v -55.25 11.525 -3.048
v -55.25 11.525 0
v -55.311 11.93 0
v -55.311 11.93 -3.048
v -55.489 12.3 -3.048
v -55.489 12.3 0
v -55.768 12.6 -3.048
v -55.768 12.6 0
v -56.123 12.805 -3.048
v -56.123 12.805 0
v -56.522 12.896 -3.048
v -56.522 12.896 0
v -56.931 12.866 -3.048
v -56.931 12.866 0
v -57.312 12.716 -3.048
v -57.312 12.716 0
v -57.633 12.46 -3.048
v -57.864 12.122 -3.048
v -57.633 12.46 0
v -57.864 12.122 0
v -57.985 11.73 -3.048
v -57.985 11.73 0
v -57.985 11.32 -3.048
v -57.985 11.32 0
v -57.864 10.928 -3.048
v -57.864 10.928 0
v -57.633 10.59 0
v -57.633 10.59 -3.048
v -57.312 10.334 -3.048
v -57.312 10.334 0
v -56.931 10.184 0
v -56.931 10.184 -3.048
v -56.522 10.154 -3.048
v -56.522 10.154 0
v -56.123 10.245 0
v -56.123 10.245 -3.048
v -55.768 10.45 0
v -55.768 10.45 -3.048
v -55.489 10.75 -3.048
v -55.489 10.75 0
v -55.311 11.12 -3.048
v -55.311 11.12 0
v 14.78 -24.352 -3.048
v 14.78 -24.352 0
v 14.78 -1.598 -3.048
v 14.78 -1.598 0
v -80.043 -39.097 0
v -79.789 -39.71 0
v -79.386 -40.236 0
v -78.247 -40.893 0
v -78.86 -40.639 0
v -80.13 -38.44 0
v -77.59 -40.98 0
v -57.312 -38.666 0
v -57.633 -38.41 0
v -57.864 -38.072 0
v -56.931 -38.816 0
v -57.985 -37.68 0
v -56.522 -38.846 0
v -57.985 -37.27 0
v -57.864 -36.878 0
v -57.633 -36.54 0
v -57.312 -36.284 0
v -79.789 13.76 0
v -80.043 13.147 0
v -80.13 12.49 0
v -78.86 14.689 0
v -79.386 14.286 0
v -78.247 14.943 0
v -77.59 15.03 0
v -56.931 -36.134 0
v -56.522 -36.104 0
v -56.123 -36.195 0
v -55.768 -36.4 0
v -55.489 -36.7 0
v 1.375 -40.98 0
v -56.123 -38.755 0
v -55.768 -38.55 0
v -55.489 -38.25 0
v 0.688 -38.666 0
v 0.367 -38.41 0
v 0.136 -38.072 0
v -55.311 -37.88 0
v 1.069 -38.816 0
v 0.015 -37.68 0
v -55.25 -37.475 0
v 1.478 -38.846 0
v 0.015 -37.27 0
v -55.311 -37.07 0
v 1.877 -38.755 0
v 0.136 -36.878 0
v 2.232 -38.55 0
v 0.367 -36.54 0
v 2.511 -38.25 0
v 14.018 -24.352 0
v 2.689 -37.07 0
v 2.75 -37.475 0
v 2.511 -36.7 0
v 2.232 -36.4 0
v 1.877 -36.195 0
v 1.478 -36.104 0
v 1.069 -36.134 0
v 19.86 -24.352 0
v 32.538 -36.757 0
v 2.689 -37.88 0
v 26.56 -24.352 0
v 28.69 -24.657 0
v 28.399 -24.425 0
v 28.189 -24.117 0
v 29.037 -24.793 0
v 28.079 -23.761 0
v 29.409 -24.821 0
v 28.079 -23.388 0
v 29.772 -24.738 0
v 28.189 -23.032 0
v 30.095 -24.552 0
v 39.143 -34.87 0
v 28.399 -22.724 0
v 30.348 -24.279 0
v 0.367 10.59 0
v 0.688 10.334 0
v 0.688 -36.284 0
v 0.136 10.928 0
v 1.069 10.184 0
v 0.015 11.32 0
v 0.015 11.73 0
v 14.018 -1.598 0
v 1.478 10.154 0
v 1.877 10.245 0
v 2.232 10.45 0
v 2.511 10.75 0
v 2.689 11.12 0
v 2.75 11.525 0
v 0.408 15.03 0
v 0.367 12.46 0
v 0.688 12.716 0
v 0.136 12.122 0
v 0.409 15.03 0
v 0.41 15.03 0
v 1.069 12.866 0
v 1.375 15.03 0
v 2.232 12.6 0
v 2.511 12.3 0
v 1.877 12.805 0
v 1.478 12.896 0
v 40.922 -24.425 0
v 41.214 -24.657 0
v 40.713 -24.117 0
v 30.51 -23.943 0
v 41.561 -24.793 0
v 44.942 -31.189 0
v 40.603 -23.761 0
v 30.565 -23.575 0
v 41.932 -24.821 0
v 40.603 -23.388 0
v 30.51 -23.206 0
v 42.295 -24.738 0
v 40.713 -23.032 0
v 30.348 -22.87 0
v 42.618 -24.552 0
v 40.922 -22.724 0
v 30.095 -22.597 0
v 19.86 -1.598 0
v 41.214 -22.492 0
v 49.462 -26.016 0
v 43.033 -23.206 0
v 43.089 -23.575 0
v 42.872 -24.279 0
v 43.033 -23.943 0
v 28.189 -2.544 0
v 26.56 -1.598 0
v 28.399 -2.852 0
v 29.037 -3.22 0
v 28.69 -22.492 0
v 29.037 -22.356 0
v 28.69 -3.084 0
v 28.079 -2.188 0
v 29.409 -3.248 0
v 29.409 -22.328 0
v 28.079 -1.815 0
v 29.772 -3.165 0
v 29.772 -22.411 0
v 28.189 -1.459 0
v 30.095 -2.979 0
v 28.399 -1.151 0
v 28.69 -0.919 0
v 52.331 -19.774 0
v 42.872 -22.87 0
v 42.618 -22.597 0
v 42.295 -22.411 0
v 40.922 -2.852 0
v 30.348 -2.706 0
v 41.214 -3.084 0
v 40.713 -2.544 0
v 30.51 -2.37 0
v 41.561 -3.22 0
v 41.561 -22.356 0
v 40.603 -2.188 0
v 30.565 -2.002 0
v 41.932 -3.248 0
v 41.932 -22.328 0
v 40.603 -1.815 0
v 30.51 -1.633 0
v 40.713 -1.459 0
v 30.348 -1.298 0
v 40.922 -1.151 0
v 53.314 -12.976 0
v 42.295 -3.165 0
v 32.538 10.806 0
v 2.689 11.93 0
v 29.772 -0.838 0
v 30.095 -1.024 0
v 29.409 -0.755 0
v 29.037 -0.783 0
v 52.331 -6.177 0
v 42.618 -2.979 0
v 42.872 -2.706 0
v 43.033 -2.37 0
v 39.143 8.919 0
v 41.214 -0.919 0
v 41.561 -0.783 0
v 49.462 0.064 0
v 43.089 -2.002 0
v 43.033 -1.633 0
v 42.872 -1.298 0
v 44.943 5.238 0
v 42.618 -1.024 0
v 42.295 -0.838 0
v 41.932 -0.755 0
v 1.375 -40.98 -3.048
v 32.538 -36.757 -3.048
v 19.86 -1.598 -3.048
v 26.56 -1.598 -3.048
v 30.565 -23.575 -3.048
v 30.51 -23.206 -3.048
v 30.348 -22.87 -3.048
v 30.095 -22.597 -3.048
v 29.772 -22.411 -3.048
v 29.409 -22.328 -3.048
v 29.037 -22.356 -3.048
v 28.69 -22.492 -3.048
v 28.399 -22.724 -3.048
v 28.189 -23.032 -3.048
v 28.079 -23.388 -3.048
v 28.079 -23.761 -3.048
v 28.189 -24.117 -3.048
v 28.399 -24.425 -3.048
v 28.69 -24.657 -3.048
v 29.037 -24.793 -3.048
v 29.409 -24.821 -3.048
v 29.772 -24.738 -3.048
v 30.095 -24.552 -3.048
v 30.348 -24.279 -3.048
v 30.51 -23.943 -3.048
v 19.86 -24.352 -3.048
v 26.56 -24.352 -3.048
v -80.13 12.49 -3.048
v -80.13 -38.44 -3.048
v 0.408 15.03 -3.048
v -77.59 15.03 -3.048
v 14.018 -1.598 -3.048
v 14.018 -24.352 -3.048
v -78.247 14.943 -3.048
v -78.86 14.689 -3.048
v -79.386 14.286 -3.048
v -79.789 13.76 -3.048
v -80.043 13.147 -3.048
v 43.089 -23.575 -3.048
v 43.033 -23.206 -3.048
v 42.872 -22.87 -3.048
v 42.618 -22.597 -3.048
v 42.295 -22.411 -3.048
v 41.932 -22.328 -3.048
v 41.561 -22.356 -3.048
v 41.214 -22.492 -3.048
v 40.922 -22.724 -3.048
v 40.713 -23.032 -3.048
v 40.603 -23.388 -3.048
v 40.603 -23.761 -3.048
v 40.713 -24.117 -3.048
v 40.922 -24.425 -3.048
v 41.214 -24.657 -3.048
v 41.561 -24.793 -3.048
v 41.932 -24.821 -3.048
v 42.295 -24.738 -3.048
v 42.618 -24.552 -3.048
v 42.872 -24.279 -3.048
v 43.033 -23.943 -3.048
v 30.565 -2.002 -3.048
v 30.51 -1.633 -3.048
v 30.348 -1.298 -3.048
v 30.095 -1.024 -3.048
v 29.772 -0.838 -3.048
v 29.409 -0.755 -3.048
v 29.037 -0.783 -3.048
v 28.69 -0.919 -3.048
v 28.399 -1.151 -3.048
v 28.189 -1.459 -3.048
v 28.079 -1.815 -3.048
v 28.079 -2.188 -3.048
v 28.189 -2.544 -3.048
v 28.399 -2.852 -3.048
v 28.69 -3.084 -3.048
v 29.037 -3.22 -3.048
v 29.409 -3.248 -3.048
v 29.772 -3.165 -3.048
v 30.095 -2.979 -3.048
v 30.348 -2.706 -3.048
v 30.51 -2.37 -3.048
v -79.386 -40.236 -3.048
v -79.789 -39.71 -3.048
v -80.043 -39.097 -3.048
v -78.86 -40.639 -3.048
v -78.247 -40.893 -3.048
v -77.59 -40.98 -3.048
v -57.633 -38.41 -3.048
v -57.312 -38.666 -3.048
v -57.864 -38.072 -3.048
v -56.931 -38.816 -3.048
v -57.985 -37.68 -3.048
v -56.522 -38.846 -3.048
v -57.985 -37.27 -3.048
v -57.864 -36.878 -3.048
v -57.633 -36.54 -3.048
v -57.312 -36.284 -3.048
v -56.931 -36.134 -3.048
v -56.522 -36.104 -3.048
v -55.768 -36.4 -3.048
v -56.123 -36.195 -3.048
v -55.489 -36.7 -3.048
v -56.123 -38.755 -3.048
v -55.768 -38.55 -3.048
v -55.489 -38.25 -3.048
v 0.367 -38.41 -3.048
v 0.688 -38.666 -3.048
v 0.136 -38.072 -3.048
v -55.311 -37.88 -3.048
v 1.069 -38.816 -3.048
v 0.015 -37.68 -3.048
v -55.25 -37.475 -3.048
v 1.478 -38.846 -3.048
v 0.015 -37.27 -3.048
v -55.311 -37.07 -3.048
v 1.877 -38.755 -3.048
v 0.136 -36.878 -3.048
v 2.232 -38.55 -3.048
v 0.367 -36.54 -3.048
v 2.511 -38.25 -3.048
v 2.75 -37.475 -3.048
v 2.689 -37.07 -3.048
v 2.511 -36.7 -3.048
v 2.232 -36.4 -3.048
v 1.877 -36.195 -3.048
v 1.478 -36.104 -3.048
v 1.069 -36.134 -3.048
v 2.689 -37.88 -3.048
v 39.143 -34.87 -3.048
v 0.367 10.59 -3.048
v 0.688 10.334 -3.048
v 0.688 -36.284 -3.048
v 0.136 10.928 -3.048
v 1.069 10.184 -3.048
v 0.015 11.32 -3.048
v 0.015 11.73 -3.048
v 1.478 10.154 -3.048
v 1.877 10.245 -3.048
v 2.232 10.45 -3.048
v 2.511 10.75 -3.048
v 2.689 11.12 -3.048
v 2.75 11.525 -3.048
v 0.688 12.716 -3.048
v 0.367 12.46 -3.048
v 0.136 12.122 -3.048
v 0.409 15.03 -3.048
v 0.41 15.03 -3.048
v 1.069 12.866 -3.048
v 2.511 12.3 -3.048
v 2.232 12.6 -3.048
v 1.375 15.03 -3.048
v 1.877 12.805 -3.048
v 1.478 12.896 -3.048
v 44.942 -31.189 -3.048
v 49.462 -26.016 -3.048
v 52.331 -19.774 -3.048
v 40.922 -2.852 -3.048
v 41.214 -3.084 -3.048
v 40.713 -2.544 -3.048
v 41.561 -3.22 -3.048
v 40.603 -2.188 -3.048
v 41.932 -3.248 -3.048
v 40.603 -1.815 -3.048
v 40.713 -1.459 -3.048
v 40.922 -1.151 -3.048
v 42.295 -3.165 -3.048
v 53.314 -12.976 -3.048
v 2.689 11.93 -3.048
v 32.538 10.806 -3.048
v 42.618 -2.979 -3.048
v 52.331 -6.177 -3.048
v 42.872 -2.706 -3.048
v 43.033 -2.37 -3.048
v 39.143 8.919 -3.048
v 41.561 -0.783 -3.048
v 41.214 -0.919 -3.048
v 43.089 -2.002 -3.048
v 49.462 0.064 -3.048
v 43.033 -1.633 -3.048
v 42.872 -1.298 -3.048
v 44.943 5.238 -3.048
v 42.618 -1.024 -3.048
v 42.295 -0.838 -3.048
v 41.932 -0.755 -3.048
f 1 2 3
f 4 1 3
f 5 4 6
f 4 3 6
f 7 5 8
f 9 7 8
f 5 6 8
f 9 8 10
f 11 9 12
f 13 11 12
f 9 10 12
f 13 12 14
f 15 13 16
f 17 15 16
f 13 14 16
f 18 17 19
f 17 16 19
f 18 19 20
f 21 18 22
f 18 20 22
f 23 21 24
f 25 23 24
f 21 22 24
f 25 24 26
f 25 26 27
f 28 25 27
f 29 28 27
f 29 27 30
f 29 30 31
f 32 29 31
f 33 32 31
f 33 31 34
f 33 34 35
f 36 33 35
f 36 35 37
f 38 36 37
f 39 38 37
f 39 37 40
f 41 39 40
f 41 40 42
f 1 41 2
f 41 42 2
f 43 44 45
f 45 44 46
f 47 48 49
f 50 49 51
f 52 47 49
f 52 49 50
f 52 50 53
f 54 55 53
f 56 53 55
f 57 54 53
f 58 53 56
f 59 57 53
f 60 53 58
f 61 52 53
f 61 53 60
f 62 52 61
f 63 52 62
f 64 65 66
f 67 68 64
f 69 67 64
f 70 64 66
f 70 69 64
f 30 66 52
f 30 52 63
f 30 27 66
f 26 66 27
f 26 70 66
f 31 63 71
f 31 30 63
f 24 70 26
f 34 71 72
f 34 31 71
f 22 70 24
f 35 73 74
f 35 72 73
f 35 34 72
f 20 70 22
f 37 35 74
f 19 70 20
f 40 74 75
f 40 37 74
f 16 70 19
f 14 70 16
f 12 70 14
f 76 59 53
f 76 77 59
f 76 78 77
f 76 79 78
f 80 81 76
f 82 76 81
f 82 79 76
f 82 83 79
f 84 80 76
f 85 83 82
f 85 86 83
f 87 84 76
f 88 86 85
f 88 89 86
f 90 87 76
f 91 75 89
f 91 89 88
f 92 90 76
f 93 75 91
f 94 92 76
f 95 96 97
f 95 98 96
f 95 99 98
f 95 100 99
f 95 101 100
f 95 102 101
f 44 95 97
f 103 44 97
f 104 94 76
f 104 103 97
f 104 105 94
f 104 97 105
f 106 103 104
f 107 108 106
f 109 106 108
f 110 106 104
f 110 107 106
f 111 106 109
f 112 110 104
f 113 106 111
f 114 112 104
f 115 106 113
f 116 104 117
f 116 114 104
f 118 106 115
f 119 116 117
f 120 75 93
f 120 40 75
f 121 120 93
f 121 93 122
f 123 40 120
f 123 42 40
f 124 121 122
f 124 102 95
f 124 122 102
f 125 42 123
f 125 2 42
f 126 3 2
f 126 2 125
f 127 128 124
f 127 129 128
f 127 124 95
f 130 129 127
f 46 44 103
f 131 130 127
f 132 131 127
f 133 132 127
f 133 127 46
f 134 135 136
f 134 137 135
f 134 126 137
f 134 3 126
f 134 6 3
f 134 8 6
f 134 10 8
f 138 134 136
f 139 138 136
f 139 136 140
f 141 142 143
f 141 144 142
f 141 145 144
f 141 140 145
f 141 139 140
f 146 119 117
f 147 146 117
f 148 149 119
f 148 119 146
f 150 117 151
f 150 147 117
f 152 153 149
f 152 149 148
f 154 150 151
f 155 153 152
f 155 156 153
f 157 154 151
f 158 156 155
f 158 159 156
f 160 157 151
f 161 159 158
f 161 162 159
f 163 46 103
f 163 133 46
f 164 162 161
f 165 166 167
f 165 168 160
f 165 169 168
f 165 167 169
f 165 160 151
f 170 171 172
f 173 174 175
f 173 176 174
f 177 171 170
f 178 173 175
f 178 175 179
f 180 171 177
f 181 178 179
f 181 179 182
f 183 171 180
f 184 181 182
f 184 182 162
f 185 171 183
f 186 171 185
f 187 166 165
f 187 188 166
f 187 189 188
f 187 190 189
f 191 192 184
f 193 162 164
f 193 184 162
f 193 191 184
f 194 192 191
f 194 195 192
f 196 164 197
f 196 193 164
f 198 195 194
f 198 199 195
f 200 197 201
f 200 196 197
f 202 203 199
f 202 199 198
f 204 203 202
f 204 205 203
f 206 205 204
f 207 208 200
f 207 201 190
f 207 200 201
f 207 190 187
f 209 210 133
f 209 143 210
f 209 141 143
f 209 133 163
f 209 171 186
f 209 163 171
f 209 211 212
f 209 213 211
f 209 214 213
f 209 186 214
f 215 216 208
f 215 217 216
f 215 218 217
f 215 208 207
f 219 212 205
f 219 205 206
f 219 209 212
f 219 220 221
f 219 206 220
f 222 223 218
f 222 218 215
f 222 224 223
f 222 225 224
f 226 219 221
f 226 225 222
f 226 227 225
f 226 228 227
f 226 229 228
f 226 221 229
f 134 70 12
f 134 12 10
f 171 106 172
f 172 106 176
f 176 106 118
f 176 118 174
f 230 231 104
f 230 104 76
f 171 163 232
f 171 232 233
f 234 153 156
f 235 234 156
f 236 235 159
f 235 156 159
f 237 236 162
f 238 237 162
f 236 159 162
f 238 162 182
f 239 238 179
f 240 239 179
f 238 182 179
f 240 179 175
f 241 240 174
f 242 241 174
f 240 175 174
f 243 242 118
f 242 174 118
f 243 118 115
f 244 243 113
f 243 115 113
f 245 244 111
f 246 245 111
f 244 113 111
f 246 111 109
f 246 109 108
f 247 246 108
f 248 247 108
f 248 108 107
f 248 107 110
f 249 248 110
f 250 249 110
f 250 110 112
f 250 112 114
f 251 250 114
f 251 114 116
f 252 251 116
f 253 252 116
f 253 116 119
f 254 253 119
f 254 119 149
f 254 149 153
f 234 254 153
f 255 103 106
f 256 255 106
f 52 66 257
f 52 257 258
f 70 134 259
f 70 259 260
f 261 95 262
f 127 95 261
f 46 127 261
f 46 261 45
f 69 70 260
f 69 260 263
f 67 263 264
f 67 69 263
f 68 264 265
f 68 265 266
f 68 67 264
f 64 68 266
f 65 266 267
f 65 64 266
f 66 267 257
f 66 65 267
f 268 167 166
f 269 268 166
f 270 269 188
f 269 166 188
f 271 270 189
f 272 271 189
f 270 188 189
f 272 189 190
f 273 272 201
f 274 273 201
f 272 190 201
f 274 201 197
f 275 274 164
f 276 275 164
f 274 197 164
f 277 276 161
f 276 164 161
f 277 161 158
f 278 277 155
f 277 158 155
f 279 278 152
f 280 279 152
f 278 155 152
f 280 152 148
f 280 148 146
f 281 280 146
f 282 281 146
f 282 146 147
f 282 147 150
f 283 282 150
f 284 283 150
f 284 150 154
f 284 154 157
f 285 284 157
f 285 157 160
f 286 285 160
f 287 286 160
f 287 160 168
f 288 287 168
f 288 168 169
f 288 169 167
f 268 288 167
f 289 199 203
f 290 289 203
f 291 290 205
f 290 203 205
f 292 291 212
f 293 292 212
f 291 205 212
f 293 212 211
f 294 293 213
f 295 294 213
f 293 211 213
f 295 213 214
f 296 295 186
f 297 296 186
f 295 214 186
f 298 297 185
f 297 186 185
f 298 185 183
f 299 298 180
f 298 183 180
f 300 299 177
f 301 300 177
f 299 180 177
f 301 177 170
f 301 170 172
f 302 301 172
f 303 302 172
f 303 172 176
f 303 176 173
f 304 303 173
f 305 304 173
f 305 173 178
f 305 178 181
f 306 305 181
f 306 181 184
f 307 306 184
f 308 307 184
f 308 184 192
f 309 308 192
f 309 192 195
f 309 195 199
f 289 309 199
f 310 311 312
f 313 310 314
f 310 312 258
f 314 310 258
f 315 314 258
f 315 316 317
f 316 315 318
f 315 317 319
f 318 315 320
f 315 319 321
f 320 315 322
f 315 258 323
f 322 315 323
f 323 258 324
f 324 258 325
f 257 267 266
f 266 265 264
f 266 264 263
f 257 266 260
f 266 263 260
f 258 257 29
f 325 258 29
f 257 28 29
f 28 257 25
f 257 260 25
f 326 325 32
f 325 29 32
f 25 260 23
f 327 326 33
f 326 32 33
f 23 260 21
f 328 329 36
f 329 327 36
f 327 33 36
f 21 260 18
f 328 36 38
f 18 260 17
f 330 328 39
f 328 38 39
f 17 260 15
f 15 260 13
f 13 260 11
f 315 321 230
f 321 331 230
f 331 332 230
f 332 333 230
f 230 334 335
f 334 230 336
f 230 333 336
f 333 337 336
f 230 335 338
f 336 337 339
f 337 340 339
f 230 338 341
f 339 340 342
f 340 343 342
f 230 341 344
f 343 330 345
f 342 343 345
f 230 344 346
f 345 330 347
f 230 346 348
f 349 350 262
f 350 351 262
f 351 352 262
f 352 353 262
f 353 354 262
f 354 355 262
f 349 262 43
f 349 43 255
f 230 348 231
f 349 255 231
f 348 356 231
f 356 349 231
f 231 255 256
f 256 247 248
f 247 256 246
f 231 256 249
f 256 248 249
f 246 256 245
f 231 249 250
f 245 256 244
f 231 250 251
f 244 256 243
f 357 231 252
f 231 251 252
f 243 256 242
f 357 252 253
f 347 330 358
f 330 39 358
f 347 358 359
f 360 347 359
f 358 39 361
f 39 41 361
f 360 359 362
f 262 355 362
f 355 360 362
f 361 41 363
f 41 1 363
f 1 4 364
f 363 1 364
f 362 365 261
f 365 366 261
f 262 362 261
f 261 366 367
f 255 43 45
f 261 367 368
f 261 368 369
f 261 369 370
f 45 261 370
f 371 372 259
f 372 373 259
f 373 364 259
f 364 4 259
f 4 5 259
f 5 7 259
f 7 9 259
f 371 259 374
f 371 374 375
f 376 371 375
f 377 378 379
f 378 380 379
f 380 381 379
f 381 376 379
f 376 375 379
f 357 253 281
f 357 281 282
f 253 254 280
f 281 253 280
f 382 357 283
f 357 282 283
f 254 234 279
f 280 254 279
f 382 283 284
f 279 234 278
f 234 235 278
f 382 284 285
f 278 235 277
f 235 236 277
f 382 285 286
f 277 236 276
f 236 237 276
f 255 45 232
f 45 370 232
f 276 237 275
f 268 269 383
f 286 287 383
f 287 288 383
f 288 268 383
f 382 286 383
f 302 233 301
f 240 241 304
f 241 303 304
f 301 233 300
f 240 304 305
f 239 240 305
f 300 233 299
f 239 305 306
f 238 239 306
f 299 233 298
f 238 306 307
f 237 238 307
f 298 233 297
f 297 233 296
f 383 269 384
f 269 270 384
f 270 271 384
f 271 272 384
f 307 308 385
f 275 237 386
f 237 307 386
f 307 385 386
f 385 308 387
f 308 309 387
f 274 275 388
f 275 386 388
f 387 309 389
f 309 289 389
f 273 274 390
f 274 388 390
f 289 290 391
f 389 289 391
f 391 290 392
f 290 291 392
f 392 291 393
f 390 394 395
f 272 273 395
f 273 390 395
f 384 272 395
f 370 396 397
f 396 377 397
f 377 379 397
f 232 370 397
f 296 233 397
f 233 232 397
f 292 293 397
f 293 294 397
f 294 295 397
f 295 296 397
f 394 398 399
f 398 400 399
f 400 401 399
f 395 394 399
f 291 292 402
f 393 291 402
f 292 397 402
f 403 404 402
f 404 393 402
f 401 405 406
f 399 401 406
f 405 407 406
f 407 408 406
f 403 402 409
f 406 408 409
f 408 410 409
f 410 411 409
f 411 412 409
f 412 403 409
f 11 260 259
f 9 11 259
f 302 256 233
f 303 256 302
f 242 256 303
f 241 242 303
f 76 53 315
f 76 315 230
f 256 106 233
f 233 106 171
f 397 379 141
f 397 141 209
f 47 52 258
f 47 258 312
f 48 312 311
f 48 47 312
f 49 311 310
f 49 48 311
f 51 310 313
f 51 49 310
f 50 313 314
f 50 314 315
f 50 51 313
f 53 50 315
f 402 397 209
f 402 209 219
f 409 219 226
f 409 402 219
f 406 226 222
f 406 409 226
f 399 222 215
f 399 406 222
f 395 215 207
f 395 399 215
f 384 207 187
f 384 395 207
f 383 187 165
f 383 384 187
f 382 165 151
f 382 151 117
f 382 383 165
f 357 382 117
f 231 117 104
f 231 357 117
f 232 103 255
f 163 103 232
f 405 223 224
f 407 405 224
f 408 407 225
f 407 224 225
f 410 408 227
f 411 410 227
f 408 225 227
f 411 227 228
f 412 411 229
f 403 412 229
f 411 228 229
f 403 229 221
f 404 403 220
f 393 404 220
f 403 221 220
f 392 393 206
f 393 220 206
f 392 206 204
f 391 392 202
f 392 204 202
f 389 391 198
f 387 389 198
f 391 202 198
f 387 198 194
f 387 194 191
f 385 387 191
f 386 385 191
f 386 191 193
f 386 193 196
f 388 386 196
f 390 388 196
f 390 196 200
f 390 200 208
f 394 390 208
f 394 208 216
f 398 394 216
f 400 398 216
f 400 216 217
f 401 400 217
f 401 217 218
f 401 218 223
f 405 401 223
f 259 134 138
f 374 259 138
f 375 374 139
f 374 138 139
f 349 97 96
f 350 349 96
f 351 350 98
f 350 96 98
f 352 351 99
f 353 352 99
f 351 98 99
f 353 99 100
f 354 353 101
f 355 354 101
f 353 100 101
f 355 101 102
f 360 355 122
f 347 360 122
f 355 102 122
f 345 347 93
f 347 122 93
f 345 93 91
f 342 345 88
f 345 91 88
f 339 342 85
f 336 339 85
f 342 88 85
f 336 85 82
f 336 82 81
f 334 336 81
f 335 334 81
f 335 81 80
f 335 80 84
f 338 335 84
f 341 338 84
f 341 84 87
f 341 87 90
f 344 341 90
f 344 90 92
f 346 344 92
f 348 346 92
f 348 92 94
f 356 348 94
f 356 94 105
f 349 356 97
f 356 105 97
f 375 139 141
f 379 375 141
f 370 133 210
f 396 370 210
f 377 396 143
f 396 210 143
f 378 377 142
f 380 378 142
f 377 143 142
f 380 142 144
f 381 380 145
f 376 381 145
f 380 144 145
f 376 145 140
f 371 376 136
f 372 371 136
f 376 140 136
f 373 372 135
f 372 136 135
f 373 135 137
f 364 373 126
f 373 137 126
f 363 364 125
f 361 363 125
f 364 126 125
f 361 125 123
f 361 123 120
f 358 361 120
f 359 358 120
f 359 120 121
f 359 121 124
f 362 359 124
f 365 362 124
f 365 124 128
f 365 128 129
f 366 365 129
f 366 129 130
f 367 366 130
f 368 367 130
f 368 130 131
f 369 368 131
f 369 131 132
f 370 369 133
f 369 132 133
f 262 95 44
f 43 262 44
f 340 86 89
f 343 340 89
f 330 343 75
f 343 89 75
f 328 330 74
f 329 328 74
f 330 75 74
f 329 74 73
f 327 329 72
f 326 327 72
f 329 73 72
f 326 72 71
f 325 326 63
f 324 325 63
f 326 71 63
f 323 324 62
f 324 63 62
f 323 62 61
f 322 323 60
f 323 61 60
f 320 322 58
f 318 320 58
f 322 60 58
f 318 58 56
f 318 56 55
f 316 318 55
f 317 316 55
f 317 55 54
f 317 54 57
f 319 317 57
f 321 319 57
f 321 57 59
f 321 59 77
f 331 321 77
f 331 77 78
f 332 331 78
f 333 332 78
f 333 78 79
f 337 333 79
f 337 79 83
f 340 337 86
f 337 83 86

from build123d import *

# Parameters (mm, degrees)
SKETCH1_R           = 1.37499852
BOSS_EXTRUDE1_DEPTH = 3.048
SKETCH2_R           = 1.25
SKETCH2_W           = 6.7
SKETCH2_H           = 22.7542
SKETCH2_W_2         = 0.762
CUT_EXTRUDE1_DEPTH  = 4.048
SKETCH3_R           = 1.37499852
BOSS_EXTRUDE2_DEPTH = 3.048
CUT_EXTRUDE3_DEPTH  = 4.048


with BuildPart() as part:
    # Sketch1 → Boss-Extrude1 (new body)
    with BuildSketch(Plane.XY):
        with BuildLine():
            Line((0.41036367, 15.02963974), (60.10036367, 15.02963974))
            ThreePointArc((60.10036367, 15.02963974), (61.896414894, 14.285690964), (62.64036367, 12.48963974))
            Line((62.64036367, 12.48963974), (62.64036367, -38.4396361))
            ThreePointArc((62.64036367, -38.4396361), (61.896414894, -40.235687324), (60.10036367, -40.9796361))
            Line((60.10036367, -40.9796361), (0.41036367, -40.9796361))
            ThreePointArc((0.41036367, -40.9796361), (-1.385687554, -40.235687324), (-2.12963633, -38.4396361))
            Line((-2.12963633, -38.4396361), (-2.12963633, 12.48963974))
            ThreePointArc((-2.12963633, 12.48963974), (-1.385687554, 14.285690964), (0.41036367, 15.02963974))
        make_face()
        with Locations((1.37500106, 11.52500108)):
            Circle(SKETCH1_R, mode=Mode.SUBTRACT)
        with Locations((59.3750019, 11.52500108)):
            Circle(SKETCH1_R, mode=Mode.SUBTRACT)
        with Locations((59.3750019, -37.47499998)):
            Circle(SKETCH1_R, mode=Mode.SUBTRACT)
        with Locations((1.37500106, -37.47499998)):
            Circle(SKETCH1_R, mode=Mode.SUBTRACT)
    extrude(amount=-BOSS_EXTRUDE1_DEPTH)

    # Sketch2 → Cut-Extrude1 (cut, through all)
    with BuildSketch(Plane.XY):
        with Locations((29.315152151, -2.00169818)):
            Circle(SKETCH2_R)
        with Locations((41.838752151, -2.00169818)):
            Circle(SKETCH2_R)
        with Locations((41.838752151, -23.57459818)):
            Circle(SKETCH2_R)
        with Locations((29.315152151, -23.57459818)):
            Circle(SKETCH2_R)
        with Locations((23.210252151, -12.97499818)):
            Rectangle(SKETCH2_W, SKETCH2_H)
        with Locations((14.399252151, -12.97499818)):
            Rectangle(SKETCH2_W_2, SKETCH2_H)
    extrude(amount=-CUT_EXTRUDE1_DEPTH, mode=Mode.SUBTRACT)

    # Sketch3 → Boss-Extrude2 (add, through all)
    with BuildSketch(Plane.XY):
        with BuildLine():
            Line((-80.129638806, 12.489638674), (-80.129638806, -38.439637166))
            ThreePointArc((-80.129638806, -38.439637166), (-79.38569003, -40.23568839), (-77.589638806, -40.979637166))
            Line((-77.589638806, -40.979637166), (2.339634914, -40.979637166))
            ThreePointArc((2.339634914, -40.979637166), (4.135686138, -40.23568839), (4.879634914, -38.439637166))
            Line((4.879634914, -38.439637166), (4.879634914, 12.489638674))
            ThreePointArc((4.879634914, 12.489638674), (4.135686138, 14.285689898), (2.339634914, 15.029638674))
            Line((2.339634914, 15.029638674), (-77.589638806, 15.029638674))
            ThreePointArc((-77.589638806, 15.029638674), (-79.38569003, 14.285689898), (-80.129638806, 12.489638674))
        make_face()
        with Locations((1.37500106, -37.47499998)):
            Circle(SKETCH3_R, mode=Mode.SUBTRACT)
        with Locations((-56.62499978, -37.47499998)):
            Circle(SKETCH3_R, mode=Mode.SUBTRACT)
        with Locations((-56.62499978, 11.52500108)):
            Circle(SKETCH3_R, mode=Mode.SUBTRACT)
        with Locations((1.37500106, 11.52500108)):
            Circle(SKETCH3_R, mode=Mode.SUBTRACT)
    extrude(amount=-BOSS_EXTRUDE2_DEPTH)

    # Sketch5 → Cut-Extrude3 (cut, through all)
    with BuildSketch(Plane(origin=(0, 0, -3.048), x_dir=(-1, 0, 0), z_dir=(0, 0, -1))):
        with BuildLine():
            Line((-1.37500106, 15.02963974), (-32.538255274, 10.806103009))
            ThreePointArc((-32.538255274, 10.806103009), (-53.314152149, -12.975840892), (-32.537536563, -36.757156908))
            Line((-32.537536563, -36.757156908), (-1.37500106, -40.979637166))
            Line((-1.37500106, -40.979637166), (-97.655992842, -40.979637166))
            Line((-97.655992842, -40.979637166), (-97.655992842, 15.02963974))
            Line((-97.655992842, 15.02963974), (-1.37500106, 15.02963974))
        make_face()
    extrude(amount=-CUT_EXTRUDE3_DEPTH, mode=Mode.SUBTRACT)


solid = part.part
